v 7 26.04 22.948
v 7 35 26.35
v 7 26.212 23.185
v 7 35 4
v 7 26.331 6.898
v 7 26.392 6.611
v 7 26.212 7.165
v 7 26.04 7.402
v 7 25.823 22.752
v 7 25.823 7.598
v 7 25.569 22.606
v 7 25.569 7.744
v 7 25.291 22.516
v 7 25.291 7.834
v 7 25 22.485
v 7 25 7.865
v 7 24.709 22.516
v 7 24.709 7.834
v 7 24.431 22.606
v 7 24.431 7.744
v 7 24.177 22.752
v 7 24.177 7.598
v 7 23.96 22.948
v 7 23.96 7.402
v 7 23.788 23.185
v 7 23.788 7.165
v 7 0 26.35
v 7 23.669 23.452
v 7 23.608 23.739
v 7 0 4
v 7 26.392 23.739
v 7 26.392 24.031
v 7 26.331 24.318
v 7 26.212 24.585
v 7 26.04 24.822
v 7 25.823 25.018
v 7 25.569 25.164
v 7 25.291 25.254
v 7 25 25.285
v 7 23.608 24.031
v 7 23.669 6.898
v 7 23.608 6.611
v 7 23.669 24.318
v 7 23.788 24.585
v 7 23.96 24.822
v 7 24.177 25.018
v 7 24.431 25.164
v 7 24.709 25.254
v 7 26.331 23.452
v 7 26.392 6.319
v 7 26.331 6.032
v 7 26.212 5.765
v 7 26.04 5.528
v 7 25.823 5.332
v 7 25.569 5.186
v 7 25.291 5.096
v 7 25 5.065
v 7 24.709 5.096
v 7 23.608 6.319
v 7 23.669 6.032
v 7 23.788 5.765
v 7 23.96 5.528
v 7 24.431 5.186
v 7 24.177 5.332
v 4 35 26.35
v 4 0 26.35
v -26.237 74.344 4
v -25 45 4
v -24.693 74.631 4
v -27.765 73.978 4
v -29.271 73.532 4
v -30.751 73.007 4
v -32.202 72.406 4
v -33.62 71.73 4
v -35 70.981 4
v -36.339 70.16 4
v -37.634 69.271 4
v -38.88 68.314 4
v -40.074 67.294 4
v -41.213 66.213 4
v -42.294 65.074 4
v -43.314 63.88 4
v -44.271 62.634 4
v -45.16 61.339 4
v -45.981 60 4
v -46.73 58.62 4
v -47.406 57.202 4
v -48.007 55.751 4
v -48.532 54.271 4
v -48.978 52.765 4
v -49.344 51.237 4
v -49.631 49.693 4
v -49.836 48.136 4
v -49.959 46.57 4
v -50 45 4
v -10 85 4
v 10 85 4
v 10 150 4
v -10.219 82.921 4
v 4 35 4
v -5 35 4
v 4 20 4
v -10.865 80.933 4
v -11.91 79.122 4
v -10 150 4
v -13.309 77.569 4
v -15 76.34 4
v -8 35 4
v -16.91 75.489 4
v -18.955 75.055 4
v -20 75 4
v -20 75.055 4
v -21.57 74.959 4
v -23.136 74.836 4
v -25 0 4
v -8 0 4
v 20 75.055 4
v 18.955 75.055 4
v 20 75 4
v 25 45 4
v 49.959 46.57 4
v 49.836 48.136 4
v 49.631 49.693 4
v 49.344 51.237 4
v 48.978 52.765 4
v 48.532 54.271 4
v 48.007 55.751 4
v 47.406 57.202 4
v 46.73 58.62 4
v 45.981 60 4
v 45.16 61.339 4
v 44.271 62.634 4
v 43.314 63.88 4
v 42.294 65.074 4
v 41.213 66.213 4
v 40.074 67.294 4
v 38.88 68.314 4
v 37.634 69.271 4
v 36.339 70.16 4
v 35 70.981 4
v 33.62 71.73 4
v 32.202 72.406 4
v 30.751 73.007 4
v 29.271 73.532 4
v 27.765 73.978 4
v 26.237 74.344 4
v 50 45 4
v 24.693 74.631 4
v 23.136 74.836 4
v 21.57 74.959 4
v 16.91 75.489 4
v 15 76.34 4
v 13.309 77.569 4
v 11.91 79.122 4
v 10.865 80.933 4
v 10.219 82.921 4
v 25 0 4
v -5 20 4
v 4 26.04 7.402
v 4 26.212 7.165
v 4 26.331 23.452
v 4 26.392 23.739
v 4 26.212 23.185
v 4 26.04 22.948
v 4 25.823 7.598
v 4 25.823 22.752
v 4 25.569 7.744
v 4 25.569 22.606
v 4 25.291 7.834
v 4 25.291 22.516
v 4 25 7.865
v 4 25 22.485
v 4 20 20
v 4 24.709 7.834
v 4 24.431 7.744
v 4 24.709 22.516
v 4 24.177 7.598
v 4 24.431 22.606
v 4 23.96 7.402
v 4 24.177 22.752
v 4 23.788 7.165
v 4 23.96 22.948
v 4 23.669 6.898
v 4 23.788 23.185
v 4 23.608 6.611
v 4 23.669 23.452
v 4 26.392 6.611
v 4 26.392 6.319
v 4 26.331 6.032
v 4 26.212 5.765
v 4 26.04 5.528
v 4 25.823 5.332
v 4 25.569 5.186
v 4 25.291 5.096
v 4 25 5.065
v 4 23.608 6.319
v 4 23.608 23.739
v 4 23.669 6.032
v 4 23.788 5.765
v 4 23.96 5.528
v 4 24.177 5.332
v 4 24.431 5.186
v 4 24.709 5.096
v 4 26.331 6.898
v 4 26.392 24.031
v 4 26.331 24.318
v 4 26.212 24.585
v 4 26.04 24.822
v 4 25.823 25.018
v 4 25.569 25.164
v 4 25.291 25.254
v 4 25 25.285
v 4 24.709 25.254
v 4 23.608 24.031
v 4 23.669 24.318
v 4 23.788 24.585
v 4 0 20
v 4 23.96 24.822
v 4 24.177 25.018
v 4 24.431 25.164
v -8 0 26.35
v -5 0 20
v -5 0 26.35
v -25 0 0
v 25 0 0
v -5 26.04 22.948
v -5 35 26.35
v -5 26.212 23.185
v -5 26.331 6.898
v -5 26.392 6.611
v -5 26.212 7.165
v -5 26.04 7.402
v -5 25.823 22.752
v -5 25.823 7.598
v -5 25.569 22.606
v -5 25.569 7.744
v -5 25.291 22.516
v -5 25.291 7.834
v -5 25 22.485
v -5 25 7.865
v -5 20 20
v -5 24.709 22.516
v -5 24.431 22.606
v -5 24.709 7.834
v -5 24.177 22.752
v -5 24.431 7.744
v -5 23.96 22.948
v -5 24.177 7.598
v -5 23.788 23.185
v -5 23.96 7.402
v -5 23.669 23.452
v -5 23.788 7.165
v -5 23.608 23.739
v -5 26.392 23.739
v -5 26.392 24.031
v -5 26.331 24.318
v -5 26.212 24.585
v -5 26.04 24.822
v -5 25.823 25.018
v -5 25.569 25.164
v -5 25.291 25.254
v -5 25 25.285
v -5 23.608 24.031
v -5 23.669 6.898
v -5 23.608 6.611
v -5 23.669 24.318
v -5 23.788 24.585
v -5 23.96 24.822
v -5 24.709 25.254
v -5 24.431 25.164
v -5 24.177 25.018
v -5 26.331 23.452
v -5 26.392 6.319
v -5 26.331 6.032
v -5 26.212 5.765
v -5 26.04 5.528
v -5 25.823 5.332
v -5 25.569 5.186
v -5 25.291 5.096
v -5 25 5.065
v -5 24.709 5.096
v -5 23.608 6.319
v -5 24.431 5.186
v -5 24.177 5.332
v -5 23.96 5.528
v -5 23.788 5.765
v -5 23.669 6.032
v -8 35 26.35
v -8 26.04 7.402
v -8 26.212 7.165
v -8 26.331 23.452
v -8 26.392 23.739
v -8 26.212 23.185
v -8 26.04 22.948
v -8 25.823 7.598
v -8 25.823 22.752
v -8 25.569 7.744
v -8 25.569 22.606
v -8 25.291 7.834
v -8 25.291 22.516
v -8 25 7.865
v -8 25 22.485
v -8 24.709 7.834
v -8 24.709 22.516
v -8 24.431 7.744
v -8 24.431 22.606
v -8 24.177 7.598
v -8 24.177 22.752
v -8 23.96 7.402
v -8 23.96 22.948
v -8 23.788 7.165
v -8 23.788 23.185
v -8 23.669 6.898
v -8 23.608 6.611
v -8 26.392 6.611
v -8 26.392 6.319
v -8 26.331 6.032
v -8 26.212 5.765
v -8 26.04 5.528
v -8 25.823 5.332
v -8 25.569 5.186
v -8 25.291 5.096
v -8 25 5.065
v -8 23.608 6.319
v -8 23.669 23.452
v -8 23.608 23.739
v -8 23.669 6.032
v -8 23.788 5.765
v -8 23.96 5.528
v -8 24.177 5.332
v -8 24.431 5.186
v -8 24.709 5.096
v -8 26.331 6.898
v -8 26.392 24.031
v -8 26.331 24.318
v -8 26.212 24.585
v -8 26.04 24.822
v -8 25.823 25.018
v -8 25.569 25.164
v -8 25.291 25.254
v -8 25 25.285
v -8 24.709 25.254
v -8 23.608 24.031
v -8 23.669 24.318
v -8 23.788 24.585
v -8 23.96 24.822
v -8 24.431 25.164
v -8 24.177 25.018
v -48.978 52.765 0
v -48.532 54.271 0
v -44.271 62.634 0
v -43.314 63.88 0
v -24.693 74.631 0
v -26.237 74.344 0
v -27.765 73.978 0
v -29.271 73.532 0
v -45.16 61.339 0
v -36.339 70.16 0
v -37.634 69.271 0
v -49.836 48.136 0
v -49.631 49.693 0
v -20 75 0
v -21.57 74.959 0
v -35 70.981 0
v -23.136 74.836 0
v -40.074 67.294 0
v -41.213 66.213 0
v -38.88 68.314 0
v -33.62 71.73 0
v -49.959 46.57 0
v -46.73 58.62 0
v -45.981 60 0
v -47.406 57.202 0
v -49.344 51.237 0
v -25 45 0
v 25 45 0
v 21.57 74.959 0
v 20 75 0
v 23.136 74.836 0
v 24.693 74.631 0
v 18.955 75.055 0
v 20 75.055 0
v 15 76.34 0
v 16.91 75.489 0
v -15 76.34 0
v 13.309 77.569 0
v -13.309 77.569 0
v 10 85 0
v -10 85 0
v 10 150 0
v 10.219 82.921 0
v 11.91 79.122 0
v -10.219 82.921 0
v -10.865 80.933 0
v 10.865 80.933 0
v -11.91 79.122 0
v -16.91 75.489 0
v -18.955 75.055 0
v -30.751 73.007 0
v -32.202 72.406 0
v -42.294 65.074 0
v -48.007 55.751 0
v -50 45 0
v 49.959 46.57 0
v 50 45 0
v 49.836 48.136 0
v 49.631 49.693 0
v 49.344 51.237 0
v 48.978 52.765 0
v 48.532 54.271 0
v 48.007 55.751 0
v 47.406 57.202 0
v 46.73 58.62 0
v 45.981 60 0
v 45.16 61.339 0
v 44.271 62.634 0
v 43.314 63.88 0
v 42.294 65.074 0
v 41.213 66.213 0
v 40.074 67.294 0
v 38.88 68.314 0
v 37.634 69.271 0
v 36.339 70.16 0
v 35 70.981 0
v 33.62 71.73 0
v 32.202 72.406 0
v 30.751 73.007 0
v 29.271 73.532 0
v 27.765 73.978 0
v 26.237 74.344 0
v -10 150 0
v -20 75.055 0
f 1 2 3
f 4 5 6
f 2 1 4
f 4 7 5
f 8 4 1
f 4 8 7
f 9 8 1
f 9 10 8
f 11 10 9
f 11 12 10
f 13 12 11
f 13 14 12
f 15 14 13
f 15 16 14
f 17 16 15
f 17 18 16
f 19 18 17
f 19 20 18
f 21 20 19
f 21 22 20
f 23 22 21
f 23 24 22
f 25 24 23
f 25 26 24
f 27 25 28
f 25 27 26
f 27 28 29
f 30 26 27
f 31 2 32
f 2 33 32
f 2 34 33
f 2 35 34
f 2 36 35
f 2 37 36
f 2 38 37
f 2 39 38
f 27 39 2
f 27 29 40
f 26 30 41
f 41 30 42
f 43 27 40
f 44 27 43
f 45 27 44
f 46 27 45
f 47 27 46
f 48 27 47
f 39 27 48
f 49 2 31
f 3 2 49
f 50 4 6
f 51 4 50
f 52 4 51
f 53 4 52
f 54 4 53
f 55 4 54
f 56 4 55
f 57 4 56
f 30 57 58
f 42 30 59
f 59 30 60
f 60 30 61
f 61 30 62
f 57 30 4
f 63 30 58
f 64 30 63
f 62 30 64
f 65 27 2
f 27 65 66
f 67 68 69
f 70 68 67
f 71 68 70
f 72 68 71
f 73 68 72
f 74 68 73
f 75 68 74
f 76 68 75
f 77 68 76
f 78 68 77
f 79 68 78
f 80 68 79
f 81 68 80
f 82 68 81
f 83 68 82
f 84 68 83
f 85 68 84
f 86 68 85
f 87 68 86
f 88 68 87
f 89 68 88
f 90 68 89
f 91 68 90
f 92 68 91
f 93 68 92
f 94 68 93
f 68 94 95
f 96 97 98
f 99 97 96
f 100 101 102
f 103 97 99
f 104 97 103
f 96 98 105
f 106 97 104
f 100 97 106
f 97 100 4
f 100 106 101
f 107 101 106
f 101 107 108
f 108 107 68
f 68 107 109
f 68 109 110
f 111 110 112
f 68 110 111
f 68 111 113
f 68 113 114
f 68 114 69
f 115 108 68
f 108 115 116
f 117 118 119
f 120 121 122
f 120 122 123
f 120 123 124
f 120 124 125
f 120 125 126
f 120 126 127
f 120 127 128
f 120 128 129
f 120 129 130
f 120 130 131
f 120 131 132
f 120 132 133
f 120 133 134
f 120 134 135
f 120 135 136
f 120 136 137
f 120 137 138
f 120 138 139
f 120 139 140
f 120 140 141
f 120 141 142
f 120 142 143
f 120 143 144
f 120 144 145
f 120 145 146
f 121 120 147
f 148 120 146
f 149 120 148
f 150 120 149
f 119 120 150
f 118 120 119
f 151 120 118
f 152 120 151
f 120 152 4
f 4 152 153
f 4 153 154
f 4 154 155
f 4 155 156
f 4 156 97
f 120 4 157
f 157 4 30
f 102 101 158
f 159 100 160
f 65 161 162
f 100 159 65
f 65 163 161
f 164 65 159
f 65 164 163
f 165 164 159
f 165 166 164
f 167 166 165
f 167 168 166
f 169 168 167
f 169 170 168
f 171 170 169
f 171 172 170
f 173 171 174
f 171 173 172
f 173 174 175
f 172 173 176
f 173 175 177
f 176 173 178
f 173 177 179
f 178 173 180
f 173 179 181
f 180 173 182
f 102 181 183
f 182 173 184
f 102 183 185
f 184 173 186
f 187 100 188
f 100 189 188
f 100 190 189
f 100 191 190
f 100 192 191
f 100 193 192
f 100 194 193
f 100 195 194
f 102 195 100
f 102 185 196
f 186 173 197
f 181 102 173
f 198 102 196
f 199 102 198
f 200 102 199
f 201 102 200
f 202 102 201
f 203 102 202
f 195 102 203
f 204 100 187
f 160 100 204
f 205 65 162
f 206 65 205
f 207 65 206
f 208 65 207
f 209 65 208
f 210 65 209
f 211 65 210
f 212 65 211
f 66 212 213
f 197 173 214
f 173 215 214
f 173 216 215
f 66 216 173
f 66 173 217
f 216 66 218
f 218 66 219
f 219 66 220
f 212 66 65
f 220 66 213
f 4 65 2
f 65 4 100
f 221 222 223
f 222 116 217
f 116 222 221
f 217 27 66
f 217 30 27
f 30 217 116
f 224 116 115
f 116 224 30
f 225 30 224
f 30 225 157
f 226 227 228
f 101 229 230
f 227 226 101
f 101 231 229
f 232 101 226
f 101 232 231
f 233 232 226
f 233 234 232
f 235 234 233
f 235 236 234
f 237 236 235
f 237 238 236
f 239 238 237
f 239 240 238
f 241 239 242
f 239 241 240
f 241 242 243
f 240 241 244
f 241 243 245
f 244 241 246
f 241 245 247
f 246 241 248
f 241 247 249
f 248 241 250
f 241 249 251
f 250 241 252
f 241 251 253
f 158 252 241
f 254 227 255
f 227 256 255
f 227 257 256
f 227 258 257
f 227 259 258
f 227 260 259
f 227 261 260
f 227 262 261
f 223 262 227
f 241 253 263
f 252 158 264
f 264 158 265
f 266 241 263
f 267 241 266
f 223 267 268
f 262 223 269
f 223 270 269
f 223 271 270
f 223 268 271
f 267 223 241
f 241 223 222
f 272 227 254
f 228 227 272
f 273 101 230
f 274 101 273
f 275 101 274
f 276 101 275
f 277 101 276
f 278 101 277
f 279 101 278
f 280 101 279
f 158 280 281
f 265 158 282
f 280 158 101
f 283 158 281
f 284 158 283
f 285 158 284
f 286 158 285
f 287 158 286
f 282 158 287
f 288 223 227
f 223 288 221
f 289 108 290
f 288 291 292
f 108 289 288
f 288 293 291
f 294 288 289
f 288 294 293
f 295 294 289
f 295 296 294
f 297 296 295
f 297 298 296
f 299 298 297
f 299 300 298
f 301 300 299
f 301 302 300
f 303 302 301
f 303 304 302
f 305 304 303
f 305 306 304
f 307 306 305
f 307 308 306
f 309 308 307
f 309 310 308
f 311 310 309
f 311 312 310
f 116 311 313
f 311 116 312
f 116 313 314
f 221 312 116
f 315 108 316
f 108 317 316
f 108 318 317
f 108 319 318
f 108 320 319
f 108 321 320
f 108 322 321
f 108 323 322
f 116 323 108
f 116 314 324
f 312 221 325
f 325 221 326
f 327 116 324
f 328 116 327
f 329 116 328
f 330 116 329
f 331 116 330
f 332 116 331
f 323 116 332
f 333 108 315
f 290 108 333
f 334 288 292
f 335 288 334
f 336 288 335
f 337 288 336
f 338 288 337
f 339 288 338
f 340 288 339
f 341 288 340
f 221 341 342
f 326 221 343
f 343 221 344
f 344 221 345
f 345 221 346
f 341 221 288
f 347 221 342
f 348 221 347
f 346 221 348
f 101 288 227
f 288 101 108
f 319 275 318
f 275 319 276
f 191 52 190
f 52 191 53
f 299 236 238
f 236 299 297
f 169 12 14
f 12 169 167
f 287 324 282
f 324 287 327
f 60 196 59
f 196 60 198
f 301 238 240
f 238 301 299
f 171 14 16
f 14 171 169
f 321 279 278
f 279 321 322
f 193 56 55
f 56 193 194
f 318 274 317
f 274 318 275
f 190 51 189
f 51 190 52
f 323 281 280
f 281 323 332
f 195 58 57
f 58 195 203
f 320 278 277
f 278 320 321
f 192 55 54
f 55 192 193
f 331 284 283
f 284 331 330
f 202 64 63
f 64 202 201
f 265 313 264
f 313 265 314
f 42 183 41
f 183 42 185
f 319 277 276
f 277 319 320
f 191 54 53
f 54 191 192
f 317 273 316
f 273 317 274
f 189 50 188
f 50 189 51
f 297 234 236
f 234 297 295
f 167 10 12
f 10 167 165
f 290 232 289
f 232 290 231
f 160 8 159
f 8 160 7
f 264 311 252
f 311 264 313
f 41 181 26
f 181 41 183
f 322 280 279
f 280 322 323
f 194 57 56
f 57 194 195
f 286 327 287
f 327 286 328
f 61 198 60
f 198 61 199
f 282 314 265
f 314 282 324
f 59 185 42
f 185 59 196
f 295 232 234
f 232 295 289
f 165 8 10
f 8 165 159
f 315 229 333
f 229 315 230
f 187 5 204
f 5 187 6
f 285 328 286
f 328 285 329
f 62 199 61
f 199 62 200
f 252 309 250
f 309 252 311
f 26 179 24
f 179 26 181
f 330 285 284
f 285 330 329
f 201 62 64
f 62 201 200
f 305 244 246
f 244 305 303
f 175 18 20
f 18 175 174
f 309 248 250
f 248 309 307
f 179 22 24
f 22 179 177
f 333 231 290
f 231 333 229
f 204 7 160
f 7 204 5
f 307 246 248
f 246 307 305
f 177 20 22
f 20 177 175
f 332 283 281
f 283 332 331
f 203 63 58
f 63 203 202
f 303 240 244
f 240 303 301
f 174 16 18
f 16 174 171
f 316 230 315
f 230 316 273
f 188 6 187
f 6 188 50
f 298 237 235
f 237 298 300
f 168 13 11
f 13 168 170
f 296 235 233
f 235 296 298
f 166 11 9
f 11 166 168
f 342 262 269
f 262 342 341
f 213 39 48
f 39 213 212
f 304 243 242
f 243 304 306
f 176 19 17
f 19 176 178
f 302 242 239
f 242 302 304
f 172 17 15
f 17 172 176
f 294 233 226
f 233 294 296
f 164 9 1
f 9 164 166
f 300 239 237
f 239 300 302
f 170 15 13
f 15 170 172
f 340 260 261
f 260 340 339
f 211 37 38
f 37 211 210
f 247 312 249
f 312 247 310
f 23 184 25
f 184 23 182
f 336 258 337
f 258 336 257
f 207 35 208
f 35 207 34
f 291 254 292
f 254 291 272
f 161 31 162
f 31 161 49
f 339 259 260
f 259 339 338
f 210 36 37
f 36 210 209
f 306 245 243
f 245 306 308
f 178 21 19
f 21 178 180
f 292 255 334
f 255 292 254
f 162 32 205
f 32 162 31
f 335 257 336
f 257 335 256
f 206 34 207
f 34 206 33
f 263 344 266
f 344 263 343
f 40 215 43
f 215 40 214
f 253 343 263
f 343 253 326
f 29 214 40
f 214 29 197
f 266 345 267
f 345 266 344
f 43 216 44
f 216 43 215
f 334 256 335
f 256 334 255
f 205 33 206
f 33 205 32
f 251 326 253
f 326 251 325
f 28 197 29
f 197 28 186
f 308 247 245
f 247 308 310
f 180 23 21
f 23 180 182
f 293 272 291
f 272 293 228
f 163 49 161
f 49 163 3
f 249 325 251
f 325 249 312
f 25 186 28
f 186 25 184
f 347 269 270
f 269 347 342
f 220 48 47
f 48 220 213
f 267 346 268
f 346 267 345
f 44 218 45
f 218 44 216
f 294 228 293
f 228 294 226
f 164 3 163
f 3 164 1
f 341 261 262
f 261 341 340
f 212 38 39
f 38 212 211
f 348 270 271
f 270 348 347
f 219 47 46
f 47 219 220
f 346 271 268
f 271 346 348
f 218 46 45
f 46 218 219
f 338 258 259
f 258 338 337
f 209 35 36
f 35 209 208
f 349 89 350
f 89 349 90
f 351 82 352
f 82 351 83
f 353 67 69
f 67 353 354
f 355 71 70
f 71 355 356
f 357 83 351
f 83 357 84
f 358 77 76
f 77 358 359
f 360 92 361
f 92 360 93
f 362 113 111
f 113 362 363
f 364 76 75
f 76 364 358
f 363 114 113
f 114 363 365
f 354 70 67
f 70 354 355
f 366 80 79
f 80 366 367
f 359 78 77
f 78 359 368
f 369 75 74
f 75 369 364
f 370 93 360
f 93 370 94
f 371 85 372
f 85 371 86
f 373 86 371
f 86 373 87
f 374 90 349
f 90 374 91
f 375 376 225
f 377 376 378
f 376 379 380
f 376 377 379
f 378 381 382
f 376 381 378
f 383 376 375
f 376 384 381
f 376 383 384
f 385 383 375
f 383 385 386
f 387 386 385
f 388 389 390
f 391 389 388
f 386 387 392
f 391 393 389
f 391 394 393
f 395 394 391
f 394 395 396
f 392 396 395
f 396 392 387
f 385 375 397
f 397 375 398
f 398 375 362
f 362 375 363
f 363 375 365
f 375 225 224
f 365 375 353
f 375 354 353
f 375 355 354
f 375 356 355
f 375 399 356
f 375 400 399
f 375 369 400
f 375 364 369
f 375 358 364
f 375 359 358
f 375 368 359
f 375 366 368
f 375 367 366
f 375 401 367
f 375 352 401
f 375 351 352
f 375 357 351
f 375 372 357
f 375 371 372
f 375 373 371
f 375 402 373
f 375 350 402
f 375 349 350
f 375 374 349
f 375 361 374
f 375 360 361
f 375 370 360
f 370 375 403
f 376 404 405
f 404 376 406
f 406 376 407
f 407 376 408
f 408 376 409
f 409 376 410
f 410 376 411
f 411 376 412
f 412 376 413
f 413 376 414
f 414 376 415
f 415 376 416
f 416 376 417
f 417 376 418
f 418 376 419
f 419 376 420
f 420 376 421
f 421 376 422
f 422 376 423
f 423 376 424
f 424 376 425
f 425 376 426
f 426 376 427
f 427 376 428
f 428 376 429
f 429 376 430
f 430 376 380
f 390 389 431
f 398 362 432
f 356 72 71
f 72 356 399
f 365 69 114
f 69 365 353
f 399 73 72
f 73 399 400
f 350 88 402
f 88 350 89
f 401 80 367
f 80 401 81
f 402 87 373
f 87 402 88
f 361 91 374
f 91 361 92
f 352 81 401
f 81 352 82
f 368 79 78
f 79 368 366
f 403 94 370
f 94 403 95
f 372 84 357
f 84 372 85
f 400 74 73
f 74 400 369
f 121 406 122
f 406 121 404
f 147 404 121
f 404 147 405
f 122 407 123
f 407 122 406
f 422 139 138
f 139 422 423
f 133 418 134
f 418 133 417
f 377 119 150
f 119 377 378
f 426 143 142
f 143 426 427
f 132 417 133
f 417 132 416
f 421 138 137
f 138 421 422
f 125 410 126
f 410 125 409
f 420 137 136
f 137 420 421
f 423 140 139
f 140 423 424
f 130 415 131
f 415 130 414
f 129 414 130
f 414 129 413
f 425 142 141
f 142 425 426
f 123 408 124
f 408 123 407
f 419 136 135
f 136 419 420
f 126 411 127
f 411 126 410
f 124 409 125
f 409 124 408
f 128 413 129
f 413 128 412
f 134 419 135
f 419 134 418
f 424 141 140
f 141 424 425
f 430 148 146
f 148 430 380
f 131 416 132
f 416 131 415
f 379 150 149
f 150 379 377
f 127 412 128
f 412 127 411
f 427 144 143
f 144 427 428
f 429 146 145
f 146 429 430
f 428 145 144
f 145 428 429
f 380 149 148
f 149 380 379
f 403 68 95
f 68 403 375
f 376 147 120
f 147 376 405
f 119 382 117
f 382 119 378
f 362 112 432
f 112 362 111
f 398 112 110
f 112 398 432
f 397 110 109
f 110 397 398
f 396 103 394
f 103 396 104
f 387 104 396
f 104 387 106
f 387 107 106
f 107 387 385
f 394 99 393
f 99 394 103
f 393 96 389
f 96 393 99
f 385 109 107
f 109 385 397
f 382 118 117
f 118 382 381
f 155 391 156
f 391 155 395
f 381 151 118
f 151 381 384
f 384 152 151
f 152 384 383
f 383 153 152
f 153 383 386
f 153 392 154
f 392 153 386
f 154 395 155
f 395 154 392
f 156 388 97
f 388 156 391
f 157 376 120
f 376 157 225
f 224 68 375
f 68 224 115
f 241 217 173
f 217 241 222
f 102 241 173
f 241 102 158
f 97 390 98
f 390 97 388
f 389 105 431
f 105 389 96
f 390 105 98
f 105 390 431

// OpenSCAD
translate([-25,0,0])
cube([50,70,4]);
translate([-5,0,0])
cube([10,20,20]);
difference(){
union(){
translate([4,0,4])
cube([3,35,22.35]);
translate([-8,0,4])
cube([3,35,22.35]);
}
translate([0,25,6.465])
rotate([0,90,0])cylinder(d=2.8,h=50,center=true,$fn=30);
translate([0,25,23.885])
rotate([0,90,0])cylinder(d=2.8,h=50,center=true,$fn=30);
}
translate([-10,0,0])
cube([20,150,4]);
difference(){
union(){
translate([-20,45,0])cylinder(d=60,h=4,$fn=120);
translate([20,45,0])cylinder(d=60,h=4,$fn=120);
}
cube([100,90,10],center=true);
}
difference(){
translate([-20,65,0])cube([40,20,4]);
translate([-20,85,-1])cylinder(d=20,h=6);
translate([20,85,-1])cylinder(d=20,h=6);
}
